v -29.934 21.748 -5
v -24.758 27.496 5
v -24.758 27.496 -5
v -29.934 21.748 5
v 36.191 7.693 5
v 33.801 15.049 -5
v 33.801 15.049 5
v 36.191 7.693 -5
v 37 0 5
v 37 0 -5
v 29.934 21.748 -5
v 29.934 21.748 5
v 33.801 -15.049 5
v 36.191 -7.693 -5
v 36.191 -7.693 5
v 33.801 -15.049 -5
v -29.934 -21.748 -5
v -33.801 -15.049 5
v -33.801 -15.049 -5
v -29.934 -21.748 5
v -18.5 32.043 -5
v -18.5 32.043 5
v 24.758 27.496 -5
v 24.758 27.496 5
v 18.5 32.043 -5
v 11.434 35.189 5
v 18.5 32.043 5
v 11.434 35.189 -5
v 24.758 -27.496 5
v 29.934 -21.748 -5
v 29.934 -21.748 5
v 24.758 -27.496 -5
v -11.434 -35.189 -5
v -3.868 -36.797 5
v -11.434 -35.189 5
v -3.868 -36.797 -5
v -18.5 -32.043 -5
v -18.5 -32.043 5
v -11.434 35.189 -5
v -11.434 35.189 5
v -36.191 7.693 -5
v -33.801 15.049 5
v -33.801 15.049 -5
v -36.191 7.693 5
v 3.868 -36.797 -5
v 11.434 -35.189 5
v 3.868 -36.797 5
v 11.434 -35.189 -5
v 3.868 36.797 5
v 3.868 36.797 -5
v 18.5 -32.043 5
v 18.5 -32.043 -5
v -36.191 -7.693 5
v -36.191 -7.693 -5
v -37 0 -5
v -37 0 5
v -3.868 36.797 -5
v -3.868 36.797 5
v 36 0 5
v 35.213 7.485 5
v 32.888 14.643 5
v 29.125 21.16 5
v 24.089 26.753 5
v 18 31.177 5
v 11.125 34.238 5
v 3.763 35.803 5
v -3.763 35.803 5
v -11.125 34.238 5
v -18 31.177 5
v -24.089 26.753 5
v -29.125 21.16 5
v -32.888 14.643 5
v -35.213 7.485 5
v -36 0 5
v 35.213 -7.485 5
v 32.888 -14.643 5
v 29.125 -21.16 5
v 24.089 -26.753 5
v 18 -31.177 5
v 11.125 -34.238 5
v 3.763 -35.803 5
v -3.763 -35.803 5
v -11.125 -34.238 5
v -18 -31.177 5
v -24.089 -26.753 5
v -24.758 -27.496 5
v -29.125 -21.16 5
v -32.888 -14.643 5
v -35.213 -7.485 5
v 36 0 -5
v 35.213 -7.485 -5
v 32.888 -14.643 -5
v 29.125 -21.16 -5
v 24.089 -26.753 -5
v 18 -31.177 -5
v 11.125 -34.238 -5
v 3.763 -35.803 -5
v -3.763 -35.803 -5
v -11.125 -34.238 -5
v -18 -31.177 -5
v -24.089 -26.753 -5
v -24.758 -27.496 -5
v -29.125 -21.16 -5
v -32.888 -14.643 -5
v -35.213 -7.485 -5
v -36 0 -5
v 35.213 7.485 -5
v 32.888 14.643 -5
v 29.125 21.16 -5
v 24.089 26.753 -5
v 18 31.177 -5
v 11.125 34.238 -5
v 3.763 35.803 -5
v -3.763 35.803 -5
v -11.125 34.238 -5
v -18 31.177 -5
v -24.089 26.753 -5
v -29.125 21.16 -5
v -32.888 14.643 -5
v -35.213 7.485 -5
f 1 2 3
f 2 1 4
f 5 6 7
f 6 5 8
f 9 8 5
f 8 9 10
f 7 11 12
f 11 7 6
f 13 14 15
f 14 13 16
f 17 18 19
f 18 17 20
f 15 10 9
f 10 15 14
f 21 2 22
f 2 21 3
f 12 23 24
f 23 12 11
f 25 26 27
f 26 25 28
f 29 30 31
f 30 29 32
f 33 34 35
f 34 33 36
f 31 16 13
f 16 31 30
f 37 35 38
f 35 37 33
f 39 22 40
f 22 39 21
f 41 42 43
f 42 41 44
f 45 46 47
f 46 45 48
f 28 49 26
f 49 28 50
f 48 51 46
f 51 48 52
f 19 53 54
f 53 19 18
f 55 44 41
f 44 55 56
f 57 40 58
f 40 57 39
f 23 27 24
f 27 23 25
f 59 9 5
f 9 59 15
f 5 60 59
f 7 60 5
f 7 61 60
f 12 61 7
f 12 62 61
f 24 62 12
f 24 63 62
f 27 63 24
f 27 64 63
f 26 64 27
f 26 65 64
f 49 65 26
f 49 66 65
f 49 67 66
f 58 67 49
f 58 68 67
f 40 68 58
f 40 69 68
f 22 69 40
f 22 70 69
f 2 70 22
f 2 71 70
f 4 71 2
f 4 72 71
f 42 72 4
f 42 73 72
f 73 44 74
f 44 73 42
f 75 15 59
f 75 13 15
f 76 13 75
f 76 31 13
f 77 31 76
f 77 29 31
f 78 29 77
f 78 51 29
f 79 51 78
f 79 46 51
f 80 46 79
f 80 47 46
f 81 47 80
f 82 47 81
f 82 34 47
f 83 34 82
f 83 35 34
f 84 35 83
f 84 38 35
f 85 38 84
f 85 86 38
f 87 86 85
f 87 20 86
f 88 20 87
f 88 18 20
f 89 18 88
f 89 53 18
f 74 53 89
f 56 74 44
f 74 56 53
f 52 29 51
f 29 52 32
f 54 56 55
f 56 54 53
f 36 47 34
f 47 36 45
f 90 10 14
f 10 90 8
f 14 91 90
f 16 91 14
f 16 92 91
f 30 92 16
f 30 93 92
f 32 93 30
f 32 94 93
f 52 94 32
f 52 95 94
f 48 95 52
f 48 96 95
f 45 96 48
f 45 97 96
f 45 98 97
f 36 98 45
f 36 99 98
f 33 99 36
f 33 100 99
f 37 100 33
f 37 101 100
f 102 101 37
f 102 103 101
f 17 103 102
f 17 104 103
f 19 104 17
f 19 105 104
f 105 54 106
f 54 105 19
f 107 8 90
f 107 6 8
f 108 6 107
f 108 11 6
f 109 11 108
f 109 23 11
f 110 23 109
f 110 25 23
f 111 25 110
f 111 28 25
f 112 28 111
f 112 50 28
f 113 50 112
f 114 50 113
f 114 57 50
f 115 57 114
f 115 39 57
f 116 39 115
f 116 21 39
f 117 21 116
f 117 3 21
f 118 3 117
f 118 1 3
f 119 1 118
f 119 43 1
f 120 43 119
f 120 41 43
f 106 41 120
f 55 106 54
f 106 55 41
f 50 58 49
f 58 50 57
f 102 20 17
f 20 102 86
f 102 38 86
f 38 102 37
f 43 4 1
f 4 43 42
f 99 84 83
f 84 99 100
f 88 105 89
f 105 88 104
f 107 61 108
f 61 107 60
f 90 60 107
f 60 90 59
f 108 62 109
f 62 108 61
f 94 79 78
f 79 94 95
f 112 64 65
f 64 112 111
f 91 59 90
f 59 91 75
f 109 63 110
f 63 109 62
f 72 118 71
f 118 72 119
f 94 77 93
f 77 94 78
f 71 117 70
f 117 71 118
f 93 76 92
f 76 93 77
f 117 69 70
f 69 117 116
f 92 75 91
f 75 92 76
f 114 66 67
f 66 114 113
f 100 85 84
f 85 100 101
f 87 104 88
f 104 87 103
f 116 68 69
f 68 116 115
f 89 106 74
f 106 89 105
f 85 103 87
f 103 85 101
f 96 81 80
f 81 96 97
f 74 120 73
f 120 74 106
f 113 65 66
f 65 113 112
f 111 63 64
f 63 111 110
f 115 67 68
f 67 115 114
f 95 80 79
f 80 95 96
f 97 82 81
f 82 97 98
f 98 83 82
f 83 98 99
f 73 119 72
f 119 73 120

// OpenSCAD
// Function to create a single hexagon
module hexagon(side) {
    difference() {
        cylinder(r= side, h = 3, $fn=6, center = true);
        cylinder(r= side -1, h = 3.1, $fn=6, center = true);
    }
}

// Parameters
side_length = 20;
recursion_depth = 4;
n = 5;


//honeycomb(side_length, recursion_depth);
//ring();

//intersection(){
//    circle(37);
//    honeycomb(side_length, n);    
//    }

//render()intersection(){
//    circle(35);
//    honeycomb(side_length, recursion_depth);
//}

render()ring();

module ring(){
difference(){
    cylinder(r = 37, h = 10, center = true);
    cylinder(r = 36, h = 10.2, center = true);
}
}


// The honeycomb shape that fills the inside of our ring
// you can change the size of the pentagons via their sidelengths
// and you can change the depth of the recursion process
module honeycomb(side, depth) {
    if (depth == 0) {
        hexagon(side);
    } else {
        for (i = [0:5]) {
            angle = i * 120;
            x_offset = side * cos(angle);
            y_offset = side * sin(angle);
            translate([x_offset, y_offset, 0])
                honeycomb(side, depth - 1);
        }
    }
}

//our final shape will have 3 parameters
// int size, for the sides of our 
